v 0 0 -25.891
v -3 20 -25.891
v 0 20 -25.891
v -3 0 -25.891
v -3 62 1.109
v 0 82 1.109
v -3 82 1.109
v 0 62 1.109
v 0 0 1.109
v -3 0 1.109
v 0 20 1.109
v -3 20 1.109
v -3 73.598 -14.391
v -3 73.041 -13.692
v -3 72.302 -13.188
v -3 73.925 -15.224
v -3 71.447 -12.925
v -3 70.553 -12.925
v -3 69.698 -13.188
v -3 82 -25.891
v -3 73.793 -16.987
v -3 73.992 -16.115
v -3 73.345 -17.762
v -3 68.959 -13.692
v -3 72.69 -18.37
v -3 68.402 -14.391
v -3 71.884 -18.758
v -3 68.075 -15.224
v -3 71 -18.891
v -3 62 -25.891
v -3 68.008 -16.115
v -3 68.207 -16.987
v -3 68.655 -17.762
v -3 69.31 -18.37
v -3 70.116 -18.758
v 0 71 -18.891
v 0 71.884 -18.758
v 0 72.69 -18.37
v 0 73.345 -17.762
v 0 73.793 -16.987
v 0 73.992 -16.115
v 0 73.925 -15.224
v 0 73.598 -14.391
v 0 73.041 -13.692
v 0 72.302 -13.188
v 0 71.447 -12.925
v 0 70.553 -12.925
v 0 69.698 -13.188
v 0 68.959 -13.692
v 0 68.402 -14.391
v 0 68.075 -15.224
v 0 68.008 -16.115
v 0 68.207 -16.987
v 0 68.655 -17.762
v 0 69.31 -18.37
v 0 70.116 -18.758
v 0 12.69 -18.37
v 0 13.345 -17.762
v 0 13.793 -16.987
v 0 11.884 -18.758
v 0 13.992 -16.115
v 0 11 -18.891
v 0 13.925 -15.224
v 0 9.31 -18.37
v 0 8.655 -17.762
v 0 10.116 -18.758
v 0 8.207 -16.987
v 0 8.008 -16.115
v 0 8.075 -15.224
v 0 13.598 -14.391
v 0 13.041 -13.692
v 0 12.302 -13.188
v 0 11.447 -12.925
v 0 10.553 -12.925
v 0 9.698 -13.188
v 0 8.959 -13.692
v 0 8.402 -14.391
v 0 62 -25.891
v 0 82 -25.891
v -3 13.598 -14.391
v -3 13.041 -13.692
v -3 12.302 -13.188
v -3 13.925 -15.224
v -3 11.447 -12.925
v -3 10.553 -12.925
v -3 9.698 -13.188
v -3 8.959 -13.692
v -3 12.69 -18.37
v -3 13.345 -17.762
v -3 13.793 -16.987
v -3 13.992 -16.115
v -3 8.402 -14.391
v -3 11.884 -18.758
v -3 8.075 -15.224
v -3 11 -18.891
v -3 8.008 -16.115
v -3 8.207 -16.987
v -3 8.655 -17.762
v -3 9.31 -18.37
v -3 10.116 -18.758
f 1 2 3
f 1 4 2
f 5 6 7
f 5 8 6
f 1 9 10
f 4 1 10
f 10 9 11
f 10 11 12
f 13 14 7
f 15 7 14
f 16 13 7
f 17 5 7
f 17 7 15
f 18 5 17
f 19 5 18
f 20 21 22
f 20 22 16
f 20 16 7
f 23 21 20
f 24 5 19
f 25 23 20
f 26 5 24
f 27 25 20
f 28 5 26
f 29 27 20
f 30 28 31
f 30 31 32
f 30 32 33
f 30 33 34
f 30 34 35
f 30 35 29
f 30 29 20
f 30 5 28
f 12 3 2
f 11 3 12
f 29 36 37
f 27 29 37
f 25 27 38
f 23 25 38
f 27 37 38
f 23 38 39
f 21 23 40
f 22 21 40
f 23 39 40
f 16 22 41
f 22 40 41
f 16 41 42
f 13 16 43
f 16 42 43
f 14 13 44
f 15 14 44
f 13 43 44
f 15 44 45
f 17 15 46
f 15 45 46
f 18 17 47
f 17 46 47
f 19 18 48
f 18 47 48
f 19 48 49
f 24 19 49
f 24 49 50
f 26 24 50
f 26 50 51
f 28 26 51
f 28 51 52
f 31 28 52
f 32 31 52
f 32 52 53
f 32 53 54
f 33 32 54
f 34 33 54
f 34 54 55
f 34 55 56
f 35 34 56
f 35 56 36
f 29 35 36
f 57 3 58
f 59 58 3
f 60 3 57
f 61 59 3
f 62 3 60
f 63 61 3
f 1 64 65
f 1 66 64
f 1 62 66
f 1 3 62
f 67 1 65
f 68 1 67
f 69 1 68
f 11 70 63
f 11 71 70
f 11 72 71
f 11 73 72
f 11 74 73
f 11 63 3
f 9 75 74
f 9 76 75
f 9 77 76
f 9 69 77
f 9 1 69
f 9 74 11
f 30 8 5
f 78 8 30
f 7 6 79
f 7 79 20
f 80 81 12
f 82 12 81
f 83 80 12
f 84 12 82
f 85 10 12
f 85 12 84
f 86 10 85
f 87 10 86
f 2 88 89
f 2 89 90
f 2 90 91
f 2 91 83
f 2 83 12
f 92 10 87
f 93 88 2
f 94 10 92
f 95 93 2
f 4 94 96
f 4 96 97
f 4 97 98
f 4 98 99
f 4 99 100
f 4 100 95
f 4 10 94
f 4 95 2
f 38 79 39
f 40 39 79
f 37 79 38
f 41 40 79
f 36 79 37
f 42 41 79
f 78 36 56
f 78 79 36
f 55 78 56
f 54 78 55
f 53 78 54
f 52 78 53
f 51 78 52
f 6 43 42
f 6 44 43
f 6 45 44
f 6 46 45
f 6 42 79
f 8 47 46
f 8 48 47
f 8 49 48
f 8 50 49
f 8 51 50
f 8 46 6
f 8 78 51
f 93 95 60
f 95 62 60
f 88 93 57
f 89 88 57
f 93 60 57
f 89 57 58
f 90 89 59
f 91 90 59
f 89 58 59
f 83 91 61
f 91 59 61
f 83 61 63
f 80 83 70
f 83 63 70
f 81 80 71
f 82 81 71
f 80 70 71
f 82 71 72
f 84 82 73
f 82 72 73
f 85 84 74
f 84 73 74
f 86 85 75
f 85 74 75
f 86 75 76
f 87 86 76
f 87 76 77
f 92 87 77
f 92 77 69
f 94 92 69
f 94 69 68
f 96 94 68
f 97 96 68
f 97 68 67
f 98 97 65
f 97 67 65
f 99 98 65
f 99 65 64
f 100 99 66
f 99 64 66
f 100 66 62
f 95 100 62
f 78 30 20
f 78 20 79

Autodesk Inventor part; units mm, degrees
ref_plane "YZ Plane" through (0, 0, 0) normal (1, 0, 0) x (0, 1, 0)
ref_plane "XZ Plane" through (0, 0, 0) normal (0, 1, 0) x (-1, 0, 0)
ref_plane "XY Plane" through (0, 0, 0) normal (0, 0, 1) x (1, 0, 0)
sketch "Esboço1" plane through (0, 0, 0) normal (0, 1, 0) x (-1, 0, 0)
  line L0 (0, 1.1088) -> (3, 1.1088)
  line L1 (3, 1.1088) -> (3, -25.8912)
  line L2 (3, -25.8912) -> (0, -25.8912)
  line L3 (0, -25.8912) -> (0, 1.1088)
  point P0 (0, 0)
  dimension "d0" = 3
  dimension "d1" = 27
extrude "Extrusão1" add sketch "Esboço1" along normal blind 82
sketch "Esboço2" plane through (0, 0, 1.1088) normal (1, 0, 0) x (0, 0, -1)
  line L0 (27, 0) -> (27, 82) projected
  line L1 (0, 0) -> (0, 82) projected
  line L2 (27, 20) -> (0, 20)
  line L3 (0, 20) -> (0, 62)
  line L4 (0, 62) -> (27, 62)
  line L5 (27, 62) -> (27, 20)
  line L6 (0, 82) -> (27, 82) projected
  point P0 (1.1088, 0)
  dimension "d4" = 42
  dimension "d5" = 20
extrude "Extrusão2" cut sketch "Esboço2" against normal blind 42 contours L2 L1 L4 L0
sketch "Esboço3" plane through (0, 82, 1.1088) normal (1, 0, 0) x (0, 0, -1)
  circle A0 centre (17, -11) radius 3
  circle A1 centre (17, -71) radius 3
  line L0 (0, -20) -> (27, -20) projected
  line L1 (27, -62) -> (0, -62) projected
  line L2 (27, -20) -> (27, 0) projected
  line L3 (27, -82) -> (27, -62) projected
  point P0 (1.1088, -82)
  dimension "d8" = 6
  dimension "d9" = 6
  dimension "d10" = 9
  dimension "d11" = 9
  dimension "d12" = 10
  dimension "d13" = 10
extrude "Extrusão3" cut sketch "Esboço3" against normal blind 42
properties part number "Fixador traseiro"
